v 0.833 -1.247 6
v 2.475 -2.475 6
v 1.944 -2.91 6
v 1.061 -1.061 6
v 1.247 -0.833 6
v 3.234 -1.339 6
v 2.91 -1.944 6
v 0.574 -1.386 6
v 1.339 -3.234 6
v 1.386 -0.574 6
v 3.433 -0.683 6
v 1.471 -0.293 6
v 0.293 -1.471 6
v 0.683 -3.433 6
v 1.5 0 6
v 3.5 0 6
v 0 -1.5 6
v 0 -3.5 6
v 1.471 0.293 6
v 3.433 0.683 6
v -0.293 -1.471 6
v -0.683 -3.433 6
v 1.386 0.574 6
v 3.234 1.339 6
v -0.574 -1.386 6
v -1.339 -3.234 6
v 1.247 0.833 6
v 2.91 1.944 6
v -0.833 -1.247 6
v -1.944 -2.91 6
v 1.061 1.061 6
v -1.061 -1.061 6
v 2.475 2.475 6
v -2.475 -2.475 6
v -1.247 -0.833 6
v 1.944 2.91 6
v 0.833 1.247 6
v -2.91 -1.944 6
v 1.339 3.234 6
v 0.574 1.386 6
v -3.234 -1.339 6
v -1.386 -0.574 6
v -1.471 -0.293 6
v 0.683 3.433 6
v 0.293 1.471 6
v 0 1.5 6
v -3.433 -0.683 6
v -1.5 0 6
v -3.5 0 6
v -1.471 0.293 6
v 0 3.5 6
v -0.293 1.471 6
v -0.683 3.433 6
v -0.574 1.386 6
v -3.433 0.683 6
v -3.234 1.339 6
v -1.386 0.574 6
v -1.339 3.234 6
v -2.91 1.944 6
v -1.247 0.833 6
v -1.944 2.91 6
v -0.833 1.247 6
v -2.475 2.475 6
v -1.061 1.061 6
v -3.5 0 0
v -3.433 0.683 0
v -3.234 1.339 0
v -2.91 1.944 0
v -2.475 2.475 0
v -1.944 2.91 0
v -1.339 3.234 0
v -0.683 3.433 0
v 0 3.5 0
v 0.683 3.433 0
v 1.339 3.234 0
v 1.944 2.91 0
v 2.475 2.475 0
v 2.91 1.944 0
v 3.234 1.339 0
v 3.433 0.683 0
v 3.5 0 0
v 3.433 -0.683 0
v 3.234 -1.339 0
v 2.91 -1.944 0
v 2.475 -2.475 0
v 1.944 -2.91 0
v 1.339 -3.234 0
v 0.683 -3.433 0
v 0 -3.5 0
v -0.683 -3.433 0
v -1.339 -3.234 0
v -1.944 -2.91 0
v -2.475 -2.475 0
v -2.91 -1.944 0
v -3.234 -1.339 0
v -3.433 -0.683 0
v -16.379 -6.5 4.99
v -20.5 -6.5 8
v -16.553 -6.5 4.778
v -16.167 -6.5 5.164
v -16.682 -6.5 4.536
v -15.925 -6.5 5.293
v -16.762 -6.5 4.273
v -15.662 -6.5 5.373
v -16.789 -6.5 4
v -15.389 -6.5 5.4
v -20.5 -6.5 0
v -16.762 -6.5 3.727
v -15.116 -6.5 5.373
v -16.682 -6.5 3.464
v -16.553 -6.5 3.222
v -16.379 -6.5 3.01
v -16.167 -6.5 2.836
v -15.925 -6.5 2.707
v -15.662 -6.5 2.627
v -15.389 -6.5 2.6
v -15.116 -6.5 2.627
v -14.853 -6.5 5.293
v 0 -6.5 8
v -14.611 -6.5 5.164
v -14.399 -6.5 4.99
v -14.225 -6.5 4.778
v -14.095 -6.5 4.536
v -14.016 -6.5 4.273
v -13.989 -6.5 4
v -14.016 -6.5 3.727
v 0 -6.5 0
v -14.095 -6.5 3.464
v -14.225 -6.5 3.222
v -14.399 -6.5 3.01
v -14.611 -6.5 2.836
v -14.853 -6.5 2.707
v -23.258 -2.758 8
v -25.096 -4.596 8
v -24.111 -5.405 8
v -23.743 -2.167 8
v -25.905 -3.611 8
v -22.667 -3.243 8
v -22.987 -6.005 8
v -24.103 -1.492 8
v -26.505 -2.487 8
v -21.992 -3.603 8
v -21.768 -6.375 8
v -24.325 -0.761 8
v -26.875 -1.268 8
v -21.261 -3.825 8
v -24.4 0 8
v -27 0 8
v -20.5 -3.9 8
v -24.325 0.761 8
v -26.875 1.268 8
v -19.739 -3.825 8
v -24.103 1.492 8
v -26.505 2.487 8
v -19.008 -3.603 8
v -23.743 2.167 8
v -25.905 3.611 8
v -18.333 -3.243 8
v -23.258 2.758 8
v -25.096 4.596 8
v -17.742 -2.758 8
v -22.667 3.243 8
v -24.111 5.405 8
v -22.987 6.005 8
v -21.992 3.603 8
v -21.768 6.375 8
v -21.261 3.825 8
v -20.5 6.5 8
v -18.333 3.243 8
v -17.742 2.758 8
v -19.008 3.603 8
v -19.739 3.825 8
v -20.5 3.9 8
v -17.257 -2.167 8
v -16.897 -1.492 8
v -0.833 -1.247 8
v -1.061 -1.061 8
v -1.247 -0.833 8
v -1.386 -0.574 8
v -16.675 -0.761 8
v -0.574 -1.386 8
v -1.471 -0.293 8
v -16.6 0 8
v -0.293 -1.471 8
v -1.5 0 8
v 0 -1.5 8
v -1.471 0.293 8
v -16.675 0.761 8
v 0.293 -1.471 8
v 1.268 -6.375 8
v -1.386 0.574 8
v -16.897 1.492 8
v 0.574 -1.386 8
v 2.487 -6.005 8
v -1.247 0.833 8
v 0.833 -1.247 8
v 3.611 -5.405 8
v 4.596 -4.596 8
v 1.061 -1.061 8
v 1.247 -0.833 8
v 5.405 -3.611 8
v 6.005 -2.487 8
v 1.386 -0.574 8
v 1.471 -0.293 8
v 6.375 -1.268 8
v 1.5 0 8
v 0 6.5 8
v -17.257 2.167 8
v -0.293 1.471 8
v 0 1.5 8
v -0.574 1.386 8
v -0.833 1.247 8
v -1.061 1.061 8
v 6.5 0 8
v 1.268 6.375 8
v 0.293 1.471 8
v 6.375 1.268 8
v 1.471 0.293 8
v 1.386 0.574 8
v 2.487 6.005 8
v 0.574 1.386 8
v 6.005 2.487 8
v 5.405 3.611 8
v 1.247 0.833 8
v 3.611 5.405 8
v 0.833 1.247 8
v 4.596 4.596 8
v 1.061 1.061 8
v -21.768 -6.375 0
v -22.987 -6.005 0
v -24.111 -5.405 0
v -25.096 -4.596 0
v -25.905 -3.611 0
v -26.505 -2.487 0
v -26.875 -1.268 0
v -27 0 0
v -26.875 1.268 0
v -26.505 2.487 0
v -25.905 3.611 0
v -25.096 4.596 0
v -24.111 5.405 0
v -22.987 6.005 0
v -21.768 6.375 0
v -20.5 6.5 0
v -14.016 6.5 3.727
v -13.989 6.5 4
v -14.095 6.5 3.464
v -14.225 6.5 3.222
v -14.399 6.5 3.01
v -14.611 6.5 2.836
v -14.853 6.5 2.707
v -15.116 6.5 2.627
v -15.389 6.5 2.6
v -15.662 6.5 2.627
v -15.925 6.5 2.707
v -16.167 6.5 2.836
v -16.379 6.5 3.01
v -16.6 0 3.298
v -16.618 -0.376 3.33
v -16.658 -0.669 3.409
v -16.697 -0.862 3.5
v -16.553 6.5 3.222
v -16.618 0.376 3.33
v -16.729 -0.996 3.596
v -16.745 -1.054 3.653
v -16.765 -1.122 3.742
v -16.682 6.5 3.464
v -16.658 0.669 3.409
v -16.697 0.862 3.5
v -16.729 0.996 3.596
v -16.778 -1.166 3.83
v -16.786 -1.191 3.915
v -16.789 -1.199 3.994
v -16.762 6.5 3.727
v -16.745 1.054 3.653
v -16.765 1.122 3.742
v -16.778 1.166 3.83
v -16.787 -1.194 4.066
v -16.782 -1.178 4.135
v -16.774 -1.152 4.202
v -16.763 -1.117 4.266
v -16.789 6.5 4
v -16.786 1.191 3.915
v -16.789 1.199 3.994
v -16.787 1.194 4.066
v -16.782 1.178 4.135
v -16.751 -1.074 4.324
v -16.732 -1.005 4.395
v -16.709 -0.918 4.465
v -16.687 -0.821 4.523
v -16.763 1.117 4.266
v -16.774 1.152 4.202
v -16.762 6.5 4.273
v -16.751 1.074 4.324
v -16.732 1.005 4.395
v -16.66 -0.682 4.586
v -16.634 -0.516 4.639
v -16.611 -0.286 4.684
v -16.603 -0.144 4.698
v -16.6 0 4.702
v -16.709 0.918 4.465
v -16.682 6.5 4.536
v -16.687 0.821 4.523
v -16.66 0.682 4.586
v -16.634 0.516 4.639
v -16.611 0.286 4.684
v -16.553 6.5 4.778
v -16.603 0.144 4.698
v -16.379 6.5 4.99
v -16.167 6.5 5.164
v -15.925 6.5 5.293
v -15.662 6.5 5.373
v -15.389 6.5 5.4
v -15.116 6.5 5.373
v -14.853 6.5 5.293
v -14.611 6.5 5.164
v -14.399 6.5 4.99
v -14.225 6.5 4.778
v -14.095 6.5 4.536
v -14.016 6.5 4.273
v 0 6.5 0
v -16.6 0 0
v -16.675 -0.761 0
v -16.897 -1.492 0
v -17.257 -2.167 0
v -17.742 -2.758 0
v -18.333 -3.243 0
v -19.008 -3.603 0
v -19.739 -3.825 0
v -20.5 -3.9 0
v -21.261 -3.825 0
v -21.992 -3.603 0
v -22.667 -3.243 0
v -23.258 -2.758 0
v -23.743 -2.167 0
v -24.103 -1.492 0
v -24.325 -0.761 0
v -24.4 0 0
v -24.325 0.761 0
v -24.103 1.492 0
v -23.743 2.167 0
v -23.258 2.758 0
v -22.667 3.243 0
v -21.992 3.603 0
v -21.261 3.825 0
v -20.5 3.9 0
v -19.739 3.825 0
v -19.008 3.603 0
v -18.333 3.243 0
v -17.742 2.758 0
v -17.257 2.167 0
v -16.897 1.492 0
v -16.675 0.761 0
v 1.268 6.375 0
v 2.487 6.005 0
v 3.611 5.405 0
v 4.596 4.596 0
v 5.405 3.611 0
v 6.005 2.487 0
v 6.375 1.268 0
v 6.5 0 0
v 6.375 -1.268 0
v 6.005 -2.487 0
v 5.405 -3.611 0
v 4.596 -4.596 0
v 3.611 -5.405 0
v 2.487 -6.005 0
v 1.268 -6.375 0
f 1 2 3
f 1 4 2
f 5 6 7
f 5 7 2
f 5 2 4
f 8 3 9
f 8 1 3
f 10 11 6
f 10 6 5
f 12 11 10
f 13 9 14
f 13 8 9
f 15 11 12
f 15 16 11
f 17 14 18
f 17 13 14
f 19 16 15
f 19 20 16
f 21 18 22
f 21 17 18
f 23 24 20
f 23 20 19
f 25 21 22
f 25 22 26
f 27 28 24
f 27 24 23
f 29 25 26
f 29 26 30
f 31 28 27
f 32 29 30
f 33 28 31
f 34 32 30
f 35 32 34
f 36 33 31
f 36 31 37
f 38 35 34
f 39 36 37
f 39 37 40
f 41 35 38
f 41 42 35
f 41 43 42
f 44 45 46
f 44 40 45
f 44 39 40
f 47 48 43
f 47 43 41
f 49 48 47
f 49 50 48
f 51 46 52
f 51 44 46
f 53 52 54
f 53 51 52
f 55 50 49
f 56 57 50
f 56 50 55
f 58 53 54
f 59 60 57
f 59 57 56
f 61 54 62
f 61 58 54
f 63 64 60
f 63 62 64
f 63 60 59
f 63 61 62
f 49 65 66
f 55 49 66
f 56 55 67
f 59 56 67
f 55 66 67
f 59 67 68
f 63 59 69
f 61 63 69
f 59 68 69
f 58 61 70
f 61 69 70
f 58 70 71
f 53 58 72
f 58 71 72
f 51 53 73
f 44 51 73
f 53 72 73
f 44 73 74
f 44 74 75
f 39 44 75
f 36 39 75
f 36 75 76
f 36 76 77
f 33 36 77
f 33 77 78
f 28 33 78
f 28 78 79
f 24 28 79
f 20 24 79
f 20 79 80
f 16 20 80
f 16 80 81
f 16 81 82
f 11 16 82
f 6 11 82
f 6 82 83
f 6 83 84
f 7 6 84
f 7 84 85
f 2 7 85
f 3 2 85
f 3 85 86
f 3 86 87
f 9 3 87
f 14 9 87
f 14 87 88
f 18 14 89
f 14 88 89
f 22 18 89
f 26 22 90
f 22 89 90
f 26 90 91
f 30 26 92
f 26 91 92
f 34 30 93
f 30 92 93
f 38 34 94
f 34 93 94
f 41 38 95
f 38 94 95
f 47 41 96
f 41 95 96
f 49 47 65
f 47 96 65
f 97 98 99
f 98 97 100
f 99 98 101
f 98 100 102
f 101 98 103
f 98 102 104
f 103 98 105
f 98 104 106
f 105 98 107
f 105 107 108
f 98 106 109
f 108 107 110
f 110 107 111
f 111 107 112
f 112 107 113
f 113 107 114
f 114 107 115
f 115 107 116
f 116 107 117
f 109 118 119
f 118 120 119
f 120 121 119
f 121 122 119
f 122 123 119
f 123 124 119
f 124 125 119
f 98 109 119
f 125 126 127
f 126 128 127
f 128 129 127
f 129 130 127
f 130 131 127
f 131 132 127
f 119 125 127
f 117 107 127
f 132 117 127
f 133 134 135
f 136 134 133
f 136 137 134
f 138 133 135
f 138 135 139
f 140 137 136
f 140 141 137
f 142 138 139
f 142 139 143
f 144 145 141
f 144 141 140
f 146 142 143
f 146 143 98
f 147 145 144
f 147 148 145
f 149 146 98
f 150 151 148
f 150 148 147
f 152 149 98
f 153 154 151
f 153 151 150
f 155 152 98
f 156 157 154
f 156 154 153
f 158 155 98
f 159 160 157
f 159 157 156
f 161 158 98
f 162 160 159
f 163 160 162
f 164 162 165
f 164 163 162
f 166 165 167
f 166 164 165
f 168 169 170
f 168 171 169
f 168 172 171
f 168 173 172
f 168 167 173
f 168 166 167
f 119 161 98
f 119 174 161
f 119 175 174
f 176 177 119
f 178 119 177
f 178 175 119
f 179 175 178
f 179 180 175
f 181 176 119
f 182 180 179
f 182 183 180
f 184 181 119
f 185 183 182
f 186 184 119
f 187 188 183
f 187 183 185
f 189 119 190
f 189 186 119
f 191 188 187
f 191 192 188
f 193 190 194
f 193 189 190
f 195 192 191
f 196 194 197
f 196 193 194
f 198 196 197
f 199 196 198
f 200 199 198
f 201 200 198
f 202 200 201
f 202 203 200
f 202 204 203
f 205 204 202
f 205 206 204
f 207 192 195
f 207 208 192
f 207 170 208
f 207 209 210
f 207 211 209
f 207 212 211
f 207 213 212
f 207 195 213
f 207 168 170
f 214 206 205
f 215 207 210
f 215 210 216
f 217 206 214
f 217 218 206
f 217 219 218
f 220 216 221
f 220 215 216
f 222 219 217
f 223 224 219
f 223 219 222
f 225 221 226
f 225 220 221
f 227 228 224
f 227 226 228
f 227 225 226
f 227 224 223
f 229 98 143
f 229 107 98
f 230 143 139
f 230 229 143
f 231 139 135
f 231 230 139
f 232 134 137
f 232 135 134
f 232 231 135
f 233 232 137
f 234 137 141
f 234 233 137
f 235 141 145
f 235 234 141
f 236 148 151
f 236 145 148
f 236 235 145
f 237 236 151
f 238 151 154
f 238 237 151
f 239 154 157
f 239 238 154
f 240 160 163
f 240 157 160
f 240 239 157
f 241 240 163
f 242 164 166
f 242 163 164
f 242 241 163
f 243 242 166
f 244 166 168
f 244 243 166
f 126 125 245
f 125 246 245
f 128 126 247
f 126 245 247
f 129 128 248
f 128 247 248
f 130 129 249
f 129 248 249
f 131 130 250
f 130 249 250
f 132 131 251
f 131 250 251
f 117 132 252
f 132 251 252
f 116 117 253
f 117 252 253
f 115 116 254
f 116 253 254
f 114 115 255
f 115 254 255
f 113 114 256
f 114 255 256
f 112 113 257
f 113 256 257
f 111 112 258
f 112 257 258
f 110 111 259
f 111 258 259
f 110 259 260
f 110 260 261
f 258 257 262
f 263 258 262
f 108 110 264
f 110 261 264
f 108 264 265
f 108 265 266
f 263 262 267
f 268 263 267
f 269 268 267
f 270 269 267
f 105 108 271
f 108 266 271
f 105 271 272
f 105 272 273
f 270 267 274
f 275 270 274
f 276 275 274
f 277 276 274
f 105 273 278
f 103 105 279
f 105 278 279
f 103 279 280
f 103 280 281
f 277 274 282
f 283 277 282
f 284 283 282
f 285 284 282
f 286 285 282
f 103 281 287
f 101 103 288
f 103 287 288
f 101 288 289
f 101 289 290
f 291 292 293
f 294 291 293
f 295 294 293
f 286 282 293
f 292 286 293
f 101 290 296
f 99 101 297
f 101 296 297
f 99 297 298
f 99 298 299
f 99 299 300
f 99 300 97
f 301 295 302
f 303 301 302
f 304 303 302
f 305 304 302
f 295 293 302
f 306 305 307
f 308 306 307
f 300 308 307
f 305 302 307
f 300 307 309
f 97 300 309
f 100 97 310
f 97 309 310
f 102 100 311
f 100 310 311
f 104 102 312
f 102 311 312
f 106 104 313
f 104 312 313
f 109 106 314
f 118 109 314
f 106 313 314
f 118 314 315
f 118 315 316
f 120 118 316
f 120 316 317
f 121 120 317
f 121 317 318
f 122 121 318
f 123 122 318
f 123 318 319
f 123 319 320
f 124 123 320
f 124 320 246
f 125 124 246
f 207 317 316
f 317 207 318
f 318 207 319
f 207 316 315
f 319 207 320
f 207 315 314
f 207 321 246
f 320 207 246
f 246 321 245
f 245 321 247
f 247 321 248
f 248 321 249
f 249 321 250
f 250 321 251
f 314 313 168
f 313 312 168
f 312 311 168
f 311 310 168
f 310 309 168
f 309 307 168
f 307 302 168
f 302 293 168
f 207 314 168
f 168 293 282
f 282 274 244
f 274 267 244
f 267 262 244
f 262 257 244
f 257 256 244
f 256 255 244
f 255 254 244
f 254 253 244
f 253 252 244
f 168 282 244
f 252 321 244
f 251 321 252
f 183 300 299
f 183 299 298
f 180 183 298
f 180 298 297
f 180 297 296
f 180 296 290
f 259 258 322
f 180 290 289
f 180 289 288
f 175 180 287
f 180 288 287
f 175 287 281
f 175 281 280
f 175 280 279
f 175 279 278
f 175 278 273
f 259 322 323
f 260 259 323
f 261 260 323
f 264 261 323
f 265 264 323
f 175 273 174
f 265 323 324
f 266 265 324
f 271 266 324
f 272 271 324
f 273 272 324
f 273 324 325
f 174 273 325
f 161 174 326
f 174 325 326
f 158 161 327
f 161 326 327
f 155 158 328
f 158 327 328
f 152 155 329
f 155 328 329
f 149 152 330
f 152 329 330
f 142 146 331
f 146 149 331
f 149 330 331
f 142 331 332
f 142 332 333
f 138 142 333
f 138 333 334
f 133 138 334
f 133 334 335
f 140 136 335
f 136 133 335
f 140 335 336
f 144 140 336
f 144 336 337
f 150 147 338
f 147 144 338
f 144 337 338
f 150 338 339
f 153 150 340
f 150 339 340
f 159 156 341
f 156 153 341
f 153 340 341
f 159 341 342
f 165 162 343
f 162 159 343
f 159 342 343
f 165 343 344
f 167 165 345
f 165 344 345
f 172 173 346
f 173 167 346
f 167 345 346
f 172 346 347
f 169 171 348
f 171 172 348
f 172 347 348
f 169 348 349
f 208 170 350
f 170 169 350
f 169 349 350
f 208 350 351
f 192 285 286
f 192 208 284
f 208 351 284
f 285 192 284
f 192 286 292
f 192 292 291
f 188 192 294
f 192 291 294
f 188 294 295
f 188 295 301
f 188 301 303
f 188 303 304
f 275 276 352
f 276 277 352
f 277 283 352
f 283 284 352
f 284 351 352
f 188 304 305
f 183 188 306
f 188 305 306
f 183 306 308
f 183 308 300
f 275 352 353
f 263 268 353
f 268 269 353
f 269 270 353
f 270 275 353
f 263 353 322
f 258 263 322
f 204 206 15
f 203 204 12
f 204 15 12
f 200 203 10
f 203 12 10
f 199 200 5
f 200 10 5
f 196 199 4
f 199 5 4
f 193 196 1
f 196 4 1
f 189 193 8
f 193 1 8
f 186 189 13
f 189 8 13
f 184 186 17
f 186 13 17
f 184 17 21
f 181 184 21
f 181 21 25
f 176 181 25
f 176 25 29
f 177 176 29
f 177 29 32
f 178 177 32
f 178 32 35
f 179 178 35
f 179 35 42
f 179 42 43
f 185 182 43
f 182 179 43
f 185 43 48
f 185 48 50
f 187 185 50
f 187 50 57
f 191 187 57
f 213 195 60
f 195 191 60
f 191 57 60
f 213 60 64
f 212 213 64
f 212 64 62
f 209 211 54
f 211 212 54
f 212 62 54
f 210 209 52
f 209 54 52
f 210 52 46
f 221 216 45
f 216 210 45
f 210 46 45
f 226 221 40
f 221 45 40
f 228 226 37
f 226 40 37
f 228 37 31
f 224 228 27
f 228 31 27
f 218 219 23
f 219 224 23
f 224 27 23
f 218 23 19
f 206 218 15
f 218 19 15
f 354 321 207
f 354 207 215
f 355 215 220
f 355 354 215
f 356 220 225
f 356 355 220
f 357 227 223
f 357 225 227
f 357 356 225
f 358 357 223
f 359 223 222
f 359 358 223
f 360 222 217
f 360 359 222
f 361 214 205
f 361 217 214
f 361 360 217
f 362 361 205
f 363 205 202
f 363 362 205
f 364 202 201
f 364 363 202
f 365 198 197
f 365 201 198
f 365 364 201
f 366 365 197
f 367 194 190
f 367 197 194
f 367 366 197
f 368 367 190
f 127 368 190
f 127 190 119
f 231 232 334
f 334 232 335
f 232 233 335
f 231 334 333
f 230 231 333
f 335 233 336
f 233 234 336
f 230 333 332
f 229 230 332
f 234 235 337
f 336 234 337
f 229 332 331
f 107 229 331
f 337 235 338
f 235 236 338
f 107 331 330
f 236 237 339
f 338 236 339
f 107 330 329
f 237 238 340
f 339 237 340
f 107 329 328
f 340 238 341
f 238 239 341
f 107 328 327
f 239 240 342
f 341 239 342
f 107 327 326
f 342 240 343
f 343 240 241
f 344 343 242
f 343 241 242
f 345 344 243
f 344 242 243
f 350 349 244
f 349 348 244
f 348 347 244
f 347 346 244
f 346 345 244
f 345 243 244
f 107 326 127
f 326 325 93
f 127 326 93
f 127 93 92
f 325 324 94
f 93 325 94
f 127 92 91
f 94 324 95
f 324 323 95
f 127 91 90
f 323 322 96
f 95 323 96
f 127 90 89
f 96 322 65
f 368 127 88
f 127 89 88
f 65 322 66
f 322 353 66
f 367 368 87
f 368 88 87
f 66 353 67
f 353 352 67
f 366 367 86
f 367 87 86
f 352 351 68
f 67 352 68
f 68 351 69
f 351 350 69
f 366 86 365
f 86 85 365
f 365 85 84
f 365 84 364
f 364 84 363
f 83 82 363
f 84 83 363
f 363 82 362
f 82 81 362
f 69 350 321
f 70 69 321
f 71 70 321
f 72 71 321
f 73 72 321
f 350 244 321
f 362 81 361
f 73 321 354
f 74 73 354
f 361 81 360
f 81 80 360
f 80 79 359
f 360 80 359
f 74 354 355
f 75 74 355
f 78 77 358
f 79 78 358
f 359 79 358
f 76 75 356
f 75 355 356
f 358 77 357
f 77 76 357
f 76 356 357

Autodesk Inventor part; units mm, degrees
ref_plane "YZ Plane" through (0, 0, 0) normal (1, 0, 0) x (0, 1, 0)
ref_plane "XZ Plane" through (0, 0, 0) normal (0, 1, 0) x (-1, 0, 0)
ref_plane "XY Plane" through (0, 0, 0) normal (0, 0, 1) x (1, 0, 0)
sketch "Skizze1" plane through (0, 0, 0) normal (0, 0, 1) x (1, 0, 0)
  circle A0 centre (0, 0) radius 1.5
  circle A1 centre (-20.5, 0) radius 1.8 projected
  circle A2 centre (-20.5, 0) radius 3.9
  line L0 (0, 0) -> (-20.5, 0) construction
  line L1 (0, 6.5) -> (-20.5, 6.5)
  line L2 (-20.5, -6.5) -> (0, -6.5)
  arc A3 (0, -6.5) -> (0, 6.5) centre (0, 0) ccw
  arc A4 (-20.5, 6.5) -> (-20.5, -6.5) centre (-20.5, 0) ccw
  point P0 (-10.25, 0)
  dimension "d0" = 3
  dimension "d1" = 7.8
  dimension "d2" = 13
extrude "Extrusion1" add sketch "Skizze1" along normal blind 8 contours A3 L2 A4 L1
sketch "Skizze2" plane through (0, 0, 0) normal (0, 0, -1) x (-1, 0, 0)
  circle A0 centre (0, 0) radius 1.5 projected
  circle A1 centre (0, 0) radius 3.5
  dimension "d5" = 7
extrude "Extrusion2" cut sketch "Skizze2" against normal blind 6 contours A0 | A1
sketch "Skizze3" plane through (-20.5, 6.5, 0) normal (0, 1, 0) x (1, 0, 0)
  line L0 (3.9, -8) -> (3.9, 0) projected
  circle A0 centre (5.1112, -4) radius 1.4
  point P0 (20.5, 0)
  dimension "d8" = 2.8
extrude "Extrusion3" cut sketch "Skizze3" against normal through all
properties part number "Holisheet_NEMA8_Syringe_pusher"
